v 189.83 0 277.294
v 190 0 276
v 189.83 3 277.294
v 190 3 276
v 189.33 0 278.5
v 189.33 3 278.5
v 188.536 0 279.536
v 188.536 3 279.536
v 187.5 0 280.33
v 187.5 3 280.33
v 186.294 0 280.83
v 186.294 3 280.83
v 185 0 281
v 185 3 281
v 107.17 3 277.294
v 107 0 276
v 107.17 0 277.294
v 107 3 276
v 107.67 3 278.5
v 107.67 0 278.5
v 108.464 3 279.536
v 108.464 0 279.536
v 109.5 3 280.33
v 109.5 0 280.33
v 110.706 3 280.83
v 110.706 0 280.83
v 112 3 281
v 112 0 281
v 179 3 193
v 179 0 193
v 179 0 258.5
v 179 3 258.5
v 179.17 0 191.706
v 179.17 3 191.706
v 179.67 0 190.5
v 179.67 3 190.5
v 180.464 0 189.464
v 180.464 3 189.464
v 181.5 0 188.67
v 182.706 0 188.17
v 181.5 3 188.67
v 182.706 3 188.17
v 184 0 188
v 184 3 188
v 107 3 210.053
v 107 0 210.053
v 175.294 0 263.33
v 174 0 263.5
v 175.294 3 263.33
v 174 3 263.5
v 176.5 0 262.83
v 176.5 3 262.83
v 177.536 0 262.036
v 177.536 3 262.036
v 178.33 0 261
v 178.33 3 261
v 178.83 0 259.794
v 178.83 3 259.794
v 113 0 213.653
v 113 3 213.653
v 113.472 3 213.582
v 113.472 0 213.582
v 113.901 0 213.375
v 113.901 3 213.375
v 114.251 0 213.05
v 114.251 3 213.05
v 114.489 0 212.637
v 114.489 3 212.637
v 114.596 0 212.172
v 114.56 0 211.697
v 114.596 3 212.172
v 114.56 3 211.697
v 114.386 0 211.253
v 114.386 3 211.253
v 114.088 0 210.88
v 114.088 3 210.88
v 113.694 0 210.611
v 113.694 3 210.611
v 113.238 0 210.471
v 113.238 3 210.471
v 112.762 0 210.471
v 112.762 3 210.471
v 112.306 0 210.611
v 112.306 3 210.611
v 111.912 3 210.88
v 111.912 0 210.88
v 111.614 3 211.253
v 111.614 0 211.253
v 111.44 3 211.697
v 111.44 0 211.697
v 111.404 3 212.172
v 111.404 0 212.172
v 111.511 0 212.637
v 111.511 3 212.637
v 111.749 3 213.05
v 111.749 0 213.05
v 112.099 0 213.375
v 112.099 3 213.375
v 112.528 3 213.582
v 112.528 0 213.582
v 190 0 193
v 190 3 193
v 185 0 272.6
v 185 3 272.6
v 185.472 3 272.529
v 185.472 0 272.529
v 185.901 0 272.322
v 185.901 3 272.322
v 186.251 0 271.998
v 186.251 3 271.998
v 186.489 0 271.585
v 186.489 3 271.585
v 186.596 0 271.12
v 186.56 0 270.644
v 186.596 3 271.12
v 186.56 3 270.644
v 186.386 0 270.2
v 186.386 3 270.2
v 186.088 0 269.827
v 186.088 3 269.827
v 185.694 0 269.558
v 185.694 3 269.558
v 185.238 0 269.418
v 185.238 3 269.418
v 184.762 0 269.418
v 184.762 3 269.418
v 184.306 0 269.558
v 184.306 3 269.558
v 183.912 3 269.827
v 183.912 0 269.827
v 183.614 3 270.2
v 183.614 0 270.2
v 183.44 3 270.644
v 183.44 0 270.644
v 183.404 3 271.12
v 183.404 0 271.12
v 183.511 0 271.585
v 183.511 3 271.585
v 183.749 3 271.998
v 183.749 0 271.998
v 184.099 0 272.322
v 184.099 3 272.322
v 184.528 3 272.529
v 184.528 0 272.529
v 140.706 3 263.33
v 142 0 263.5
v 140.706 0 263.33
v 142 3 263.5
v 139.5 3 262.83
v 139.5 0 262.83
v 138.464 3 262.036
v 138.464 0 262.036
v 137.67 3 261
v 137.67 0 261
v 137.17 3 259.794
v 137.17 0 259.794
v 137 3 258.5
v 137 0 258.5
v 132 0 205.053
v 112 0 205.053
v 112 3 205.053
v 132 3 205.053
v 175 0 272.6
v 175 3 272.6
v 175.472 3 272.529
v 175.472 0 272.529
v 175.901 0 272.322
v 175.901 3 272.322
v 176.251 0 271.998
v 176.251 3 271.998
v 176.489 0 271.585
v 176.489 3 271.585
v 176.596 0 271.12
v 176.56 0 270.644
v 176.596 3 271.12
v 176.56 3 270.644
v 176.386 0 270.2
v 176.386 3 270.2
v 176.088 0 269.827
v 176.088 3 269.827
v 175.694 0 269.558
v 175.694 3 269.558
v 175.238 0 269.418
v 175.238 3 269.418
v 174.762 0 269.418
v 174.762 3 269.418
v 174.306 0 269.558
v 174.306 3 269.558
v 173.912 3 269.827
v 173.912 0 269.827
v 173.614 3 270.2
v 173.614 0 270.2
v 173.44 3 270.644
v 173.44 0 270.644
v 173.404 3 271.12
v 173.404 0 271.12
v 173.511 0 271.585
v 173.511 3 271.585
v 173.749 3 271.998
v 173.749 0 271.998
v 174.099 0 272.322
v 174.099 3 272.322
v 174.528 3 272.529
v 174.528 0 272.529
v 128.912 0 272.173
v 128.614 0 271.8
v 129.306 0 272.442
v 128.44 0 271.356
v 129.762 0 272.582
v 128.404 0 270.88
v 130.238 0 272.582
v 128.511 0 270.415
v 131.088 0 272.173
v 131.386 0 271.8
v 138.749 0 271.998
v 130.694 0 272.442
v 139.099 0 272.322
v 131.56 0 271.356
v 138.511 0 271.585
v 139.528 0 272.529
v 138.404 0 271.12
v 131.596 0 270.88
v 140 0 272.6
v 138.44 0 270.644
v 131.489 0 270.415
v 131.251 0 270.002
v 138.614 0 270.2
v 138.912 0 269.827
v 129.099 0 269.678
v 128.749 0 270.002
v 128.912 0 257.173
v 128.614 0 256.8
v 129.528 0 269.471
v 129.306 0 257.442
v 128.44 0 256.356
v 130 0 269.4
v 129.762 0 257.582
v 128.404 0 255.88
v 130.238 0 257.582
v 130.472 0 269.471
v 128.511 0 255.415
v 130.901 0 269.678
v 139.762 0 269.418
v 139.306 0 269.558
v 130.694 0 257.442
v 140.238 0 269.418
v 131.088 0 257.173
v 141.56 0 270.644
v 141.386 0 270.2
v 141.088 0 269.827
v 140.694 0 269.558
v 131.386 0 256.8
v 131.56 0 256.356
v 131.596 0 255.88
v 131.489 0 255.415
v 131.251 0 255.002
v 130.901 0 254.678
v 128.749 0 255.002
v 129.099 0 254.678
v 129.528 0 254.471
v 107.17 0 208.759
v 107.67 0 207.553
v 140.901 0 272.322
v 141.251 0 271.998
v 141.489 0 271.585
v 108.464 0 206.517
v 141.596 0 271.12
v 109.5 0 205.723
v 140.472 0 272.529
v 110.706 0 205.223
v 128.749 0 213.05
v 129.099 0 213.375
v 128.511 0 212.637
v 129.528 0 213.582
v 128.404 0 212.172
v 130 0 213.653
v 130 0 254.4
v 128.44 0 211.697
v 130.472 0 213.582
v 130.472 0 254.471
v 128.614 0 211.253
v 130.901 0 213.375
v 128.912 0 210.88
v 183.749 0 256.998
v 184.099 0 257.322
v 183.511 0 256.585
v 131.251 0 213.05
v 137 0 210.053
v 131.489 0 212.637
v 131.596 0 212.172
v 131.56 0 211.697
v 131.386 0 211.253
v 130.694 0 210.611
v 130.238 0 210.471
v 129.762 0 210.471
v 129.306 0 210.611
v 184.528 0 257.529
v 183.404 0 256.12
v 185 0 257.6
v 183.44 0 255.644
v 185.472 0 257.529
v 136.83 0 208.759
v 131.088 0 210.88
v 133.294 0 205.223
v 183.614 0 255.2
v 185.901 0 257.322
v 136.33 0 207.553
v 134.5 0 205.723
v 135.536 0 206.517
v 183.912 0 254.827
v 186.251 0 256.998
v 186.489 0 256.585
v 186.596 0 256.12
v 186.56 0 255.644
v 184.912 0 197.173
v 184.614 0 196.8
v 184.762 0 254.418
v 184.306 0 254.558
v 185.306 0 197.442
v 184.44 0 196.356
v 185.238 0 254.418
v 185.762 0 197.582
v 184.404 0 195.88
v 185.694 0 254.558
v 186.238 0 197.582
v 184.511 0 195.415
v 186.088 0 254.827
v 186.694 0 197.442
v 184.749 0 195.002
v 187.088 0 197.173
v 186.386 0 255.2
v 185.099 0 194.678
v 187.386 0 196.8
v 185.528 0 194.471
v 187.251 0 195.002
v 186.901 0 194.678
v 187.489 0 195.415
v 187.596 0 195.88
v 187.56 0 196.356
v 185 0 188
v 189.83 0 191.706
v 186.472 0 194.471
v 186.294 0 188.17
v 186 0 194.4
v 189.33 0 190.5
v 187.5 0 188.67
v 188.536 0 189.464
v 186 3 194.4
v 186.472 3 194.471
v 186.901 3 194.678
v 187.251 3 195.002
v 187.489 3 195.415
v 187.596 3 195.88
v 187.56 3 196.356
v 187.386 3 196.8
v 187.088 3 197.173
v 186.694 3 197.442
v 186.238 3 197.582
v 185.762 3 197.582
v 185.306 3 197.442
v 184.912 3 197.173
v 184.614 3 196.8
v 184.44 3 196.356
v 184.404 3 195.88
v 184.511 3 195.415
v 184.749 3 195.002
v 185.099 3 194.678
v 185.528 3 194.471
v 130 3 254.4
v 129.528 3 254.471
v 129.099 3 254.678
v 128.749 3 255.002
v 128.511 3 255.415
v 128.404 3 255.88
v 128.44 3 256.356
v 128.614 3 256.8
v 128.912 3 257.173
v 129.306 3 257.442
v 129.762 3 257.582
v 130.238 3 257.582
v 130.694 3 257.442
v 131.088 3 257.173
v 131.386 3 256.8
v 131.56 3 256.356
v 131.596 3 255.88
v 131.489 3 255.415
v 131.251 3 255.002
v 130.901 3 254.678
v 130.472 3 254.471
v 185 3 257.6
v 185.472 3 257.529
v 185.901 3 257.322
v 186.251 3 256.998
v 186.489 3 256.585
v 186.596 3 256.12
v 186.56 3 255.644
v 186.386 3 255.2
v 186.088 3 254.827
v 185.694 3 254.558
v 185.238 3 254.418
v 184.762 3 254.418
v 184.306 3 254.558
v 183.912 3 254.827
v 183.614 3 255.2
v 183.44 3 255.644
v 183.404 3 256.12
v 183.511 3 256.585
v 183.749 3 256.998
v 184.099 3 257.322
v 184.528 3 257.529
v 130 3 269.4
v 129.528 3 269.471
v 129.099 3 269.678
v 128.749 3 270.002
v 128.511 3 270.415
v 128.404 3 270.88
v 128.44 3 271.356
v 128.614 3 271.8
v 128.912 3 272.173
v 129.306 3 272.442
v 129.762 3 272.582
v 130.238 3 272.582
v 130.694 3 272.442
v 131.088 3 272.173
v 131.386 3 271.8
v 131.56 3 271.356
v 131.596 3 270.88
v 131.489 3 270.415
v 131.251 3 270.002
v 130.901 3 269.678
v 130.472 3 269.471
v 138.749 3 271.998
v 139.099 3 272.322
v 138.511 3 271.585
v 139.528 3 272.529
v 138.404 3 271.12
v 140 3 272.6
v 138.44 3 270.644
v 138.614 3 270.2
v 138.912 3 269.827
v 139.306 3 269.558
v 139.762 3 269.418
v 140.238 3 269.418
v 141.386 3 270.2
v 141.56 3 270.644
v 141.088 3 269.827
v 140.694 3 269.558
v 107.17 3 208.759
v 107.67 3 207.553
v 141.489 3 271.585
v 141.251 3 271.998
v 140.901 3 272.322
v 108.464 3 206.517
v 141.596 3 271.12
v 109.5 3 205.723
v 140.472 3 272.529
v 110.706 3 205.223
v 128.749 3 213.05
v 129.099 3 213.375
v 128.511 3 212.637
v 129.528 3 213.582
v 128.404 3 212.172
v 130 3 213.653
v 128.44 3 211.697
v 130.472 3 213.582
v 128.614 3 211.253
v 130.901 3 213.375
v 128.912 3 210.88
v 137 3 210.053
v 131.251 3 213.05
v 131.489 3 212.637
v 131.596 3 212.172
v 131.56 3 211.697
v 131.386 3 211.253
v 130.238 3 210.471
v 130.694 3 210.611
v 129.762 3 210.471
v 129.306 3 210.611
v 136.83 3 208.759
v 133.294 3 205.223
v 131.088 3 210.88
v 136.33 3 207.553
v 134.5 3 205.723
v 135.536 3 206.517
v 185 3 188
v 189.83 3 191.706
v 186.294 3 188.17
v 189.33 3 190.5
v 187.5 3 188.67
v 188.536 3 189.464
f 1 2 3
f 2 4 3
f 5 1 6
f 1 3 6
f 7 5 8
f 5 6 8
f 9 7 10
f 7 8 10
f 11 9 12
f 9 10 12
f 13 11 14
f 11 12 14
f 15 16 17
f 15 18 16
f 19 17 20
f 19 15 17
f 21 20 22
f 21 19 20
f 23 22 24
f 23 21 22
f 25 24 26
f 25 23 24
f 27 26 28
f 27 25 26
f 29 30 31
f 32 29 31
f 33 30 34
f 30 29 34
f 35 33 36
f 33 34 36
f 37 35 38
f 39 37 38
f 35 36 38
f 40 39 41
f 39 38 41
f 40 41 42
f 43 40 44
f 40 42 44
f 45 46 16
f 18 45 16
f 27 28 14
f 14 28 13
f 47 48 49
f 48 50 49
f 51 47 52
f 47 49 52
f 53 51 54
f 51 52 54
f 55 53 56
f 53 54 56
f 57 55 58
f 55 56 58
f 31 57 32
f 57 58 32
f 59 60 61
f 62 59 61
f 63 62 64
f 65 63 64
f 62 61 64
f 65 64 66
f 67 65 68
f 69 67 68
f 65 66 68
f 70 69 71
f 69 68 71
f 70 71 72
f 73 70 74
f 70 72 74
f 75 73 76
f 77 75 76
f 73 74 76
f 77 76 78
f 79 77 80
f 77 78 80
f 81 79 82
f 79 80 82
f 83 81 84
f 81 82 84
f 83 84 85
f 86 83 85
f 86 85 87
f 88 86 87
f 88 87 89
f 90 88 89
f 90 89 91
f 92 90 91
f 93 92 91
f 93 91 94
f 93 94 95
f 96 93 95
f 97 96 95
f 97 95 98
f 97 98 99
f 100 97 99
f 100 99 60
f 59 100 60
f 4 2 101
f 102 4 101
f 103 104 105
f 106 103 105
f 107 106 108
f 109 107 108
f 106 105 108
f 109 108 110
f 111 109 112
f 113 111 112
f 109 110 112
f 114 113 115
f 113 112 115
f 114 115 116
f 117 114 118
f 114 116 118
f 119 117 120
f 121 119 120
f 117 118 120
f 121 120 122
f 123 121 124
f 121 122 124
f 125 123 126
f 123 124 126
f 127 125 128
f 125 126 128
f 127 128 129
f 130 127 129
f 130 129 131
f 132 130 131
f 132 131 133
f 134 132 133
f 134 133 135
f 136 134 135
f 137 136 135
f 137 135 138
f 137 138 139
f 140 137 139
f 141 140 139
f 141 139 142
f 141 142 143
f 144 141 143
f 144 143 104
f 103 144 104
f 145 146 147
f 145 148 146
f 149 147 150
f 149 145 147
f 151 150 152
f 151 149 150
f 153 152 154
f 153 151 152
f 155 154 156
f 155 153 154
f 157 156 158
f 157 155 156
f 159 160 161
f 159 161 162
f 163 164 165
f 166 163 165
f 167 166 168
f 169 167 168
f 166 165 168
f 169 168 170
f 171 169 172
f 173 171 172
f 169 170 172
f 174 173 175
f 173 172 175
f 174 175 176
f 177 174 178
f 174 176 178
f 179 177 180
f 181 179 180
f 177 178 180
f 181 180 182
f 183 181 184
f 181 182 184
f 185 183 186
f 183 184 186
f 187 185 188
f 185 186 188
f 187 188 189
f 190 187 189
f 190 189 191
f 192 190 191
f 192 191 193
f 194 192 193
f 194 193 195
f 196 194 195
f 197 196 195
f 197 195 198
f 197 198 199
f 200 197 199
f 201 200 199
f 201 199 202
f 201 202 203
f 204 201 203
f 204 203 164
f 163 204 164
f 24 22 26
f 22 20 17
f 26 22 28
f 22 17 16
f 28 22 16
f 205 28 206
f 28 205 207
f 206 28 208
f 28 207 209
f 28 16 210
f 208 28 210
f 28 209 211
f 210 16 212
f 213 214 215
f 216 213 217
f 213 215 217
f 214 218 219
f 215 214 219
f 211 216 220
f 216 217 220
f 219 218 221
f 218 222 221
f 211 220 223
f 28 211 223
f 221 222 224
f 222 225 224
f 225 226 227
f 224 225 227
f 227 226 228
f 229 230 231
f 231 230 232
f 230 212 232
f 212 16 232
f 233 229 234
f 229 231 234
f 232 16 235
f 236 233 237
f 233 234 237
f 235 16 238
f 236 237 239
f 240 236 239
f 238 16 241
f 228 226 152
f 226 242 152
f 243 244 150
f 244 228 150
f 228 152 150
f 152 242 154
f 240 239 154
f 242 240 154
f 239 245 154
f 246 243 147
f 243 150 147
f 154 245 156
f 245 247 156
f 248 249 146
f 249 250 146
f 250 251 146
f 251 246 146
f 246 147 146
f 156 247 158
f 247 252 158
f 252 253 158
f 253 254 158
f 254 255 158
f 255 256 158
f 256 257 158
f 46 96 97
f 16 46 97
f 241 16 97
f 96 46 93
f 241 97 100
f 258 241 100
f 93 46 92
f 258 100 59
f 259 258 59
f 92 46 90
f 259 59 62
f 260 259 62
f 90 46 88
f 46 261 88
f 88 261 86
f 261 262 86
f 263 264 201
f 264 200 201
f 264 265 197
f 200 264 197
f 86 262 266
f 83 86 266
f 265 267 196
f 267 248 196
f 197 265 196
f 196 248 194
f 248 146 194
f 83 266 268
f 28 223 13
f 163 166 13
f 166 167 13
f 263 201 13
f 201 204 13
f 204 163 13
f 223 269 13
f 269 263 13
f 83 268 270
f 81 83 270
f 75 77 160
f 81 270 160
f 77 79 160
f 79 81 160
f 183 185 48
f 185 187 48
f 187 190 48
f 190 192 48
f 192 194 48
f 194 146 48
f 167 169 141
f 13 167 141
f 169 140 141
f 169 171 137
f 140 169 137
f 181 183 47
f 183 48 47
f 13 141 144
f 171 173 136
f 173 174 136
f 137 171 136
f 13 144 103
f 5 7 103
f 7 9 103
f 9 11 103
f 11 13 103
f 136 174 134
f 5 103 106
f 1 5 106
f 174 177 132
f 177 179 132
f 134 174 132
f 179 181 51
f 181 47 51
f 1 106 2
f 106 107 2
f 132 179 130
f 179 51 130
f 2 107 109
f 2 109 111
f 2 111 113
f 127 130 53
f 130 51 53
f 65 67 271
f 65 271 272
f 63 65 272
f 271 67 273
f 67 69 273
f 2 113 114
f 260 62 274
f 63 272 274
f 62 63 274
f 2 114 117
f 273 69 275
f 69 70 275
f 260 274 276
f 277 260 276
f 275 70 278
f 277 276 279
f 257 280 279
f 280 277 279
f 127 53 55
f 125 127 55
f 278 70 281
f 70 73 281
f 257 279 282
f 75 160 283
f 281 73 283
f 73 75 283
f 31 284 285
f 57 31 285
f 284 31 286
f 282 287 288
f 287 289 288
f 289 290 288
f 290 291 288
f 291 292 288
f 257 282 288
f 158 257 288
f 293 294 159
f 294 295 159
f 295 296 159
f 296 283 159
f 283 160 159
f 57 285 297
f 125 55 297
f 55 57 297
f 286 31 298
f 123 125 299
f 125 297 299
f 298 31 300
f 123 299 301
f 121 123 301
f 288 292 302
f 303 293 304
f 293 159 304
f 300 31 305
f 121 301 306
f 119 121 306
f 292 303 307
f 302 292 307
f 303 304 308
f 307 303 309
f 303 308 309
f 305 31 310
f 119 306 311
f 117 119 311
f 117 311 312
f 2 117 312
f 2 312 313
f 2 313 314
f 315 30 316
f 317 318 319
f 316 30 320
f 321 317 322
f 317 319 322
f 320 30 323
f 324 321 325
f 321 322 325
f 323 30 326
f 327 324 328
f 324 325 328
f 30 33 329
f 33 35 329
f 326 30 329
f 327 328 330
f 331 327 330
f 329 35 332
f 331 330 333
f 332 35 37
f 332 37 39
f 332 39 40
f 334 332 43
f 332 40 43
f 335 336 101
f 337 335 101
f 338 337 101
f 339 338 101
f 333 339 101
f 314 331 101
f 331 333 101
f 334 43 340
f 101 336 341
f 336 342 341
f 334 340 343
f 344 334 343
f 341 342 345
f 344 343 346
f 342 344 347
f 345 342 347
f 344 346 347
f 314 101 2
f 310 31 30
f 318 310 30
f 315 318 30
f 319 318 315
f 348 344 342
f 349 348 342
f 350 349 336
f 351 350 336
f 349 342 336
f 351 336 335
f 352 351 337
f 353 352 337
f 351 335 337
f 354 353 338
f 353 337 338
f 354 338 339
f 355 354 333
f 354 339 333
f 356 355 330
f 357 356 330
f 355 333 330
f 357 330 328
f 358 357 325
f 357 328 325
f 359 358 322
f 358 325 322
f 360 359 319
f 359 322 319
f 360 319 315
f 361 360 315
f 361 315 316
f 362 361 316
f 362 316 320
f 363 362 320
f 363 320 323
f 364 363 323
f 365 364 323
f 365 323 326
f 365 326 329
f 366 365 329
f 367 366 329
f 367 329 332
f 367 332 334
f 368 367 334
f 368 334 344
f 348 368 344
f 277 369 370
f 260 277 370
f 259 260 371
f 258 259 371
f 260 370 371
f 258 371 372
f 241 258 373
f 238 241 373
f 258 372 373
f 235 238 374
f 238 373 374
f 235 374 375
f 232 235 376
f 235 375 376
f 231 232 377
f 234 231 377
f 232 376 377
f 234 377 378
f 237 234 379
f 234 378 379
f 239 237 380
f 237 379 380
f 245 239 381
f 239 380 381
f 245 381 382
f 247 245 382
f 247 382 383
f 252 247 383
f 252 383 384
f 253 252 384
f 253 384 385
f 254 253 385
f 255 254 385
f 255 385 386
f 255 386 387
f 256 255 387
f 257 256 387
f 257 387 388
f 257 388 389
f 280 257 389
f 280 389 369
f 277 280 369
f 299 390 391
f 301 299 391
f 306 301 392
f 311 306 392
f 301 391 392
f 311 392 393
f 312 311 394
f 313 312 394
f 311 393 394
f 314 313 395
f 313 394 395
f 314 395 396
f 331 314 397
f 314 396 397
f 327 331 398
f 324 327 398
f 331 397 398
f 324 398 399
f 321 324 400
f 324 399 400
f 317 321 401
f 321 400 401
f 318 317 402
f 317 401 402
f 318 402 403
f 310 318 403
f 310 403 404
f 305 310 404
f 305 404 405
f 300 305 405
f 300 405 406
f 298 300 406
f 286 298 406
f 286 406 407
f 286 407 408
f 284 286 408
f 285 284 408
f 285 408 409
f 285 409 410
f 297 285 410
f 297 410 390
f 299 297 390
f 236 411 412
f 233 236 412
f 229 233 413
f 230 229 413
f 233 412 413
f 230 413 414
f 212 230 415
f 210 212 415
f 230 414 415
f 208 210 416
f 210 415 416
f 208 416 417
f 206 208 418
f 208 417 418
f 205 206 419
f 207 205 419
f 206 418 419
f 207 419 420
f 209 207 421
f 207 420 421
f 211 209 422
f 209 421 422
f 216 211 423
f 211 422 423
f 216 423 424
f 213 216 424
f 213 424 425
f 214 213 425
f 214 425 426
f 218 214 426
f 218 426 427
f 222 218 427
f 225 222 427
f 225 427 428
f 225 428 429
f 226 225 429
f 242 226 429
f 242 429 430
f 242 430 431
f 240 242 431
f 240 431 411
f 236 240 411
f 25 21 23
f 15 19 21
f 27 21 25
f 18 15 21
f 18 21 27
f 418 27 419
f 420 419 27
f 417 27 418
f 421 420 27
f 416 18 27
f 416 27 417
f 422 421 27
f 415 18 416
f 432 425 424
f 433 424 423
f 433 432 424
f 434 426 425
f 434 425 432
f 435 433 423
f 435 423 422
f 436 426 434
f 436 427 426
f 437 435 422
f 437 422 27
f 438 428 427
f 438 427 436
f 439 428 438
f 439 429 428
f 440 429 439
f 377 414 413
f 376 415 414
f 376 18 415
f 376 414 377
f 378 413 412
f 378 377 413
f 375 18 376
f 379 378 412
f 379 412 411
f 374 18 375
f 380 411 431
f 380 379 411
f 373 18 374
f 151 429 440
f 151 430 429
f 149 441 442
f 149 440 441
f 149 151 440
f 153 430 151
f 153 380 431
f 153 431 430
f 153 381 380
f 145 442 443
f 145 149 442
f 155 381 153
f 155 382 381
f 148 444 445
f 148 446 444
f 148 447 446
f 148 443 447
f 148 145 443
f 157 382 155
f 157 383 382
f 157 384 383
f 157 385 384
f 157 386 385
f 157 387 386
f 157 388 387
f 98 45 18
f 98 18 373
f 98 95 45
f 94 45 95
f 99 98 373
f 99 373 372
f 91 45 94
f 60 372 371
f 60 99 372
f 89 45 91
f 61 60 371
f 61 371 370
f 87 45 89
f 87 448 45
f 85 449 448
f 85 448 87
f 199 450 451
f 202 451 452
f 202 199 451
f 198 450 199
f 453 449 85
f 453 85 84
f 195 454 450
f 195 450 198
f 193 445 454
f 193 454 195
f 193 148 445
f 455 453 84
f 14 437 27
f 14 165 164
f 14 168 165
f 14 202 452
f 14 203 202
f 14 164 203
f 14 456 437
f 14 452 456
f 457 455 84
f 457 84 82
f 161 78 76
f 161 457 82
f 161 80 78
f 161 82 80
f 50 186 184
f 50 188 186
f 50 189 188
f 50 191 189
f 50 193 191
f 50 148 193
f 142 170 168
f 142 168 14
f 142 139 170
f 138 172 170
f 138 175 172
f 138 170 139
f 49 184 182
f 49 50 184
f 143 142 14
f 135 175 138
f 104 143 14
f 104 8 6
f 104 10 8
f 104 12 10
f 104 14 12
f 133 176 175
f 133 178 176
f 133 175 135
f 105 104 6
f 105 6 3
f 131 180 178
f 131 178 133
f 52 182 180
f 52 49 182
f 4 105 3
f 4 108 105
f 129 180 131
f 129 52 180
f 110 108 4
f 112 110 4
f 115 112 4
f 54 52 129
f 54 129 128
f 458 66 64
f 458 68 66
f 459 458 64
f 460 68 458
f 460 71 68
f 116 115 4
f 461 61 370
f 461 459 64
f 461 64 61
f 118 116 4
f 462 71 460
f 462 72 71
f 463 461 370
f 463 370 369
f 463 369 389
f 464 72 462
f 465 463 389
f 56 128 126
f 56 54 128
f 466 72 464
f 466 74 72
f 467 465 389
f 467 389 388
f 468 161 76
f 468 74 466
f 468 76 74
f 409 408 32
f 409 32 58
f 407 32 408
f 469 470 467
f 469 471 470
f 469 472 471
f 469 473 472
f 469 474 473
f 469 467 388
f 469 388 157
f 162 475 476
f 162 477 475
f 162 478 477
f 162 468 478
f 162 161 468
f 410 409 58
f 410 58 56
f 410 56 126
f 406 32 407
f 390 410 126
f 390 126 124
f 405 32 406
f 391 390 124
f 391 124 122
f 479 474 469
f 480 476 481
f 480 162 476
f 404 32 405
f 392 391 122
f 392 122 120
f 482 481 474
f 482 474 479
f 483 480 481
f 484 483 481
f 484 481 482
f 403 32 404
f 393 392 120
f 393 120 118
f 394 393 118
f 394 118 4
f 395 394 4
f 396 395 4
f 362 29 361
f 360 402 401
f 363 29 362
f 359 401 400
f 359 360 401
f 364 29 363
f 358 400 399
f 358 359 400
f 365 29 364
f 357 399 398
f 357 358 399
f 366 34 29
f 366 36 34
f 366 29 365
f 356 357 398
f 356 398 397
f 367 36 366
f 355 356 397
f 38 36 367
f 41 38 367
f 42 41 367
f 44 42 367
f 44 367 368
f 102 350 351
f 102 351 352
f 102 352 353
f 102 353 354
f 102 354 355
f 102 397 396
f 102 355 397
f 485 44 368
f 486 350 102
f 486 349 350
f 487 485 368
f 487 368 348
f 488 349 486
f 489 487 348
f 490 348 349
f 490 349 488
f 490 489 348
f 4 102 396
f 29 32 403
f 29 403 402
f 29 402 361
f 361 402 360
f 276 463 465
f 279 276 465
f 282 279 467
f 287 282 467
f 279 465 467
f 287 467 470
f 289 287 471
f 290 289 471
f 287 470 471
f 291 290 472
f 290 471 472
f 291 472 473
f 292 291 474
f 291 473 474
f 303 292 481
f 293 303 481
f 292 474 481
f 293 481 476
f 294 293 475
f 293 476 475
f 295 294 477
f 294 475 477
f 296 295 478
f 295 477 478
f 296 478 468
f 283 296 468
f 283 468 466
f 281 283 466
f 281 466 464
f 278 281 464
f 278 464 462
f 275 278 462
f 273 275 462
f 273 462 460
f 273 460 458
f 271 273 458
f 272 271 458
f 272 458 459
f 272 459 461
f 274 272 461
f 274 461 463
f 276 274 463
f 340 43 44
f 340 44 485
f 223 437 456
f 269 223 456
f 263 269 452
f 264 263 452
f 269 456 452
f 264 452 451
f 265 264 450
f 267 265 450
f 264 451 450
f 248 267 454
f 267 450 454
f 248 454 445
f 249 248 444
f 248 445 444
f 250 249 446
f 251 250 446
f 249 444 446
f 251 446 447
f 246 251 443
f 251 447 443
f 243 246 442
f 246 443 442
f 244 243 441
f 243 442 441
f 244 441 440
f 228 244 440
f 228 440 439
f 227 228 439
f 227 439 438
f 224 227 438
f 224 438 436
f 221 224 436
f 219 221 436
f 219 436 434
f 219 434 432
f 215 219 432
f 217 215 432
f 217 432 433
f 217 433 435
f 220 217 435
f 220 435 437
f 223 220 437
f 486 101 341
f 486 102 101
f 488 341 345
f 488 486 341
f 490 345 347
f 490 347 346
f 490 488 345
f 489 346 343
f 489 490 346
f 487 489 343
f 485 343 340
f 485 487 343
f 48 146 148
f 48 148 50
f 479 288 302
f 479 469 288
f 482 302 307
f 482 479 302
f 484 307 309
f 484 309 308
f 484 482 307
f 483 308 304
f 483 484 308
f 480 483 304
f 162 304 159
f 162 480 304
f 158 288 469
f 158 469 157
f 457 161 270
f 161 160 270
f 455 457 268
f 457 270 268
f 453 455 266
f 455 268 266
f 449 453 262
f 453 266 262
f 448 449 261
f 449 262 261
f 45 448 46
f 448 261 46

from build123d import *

# Parameters (mm, degrees)
EXTRUDE_1049_DEPTH      = 3
SKETCH_2_R              = 37.5
SKETCH_2_R_2            = 1.6
CUT_EXTRUDE_1714_DEPTH  = 3
SKETCH_8_W              = 65
SKETCH_8_H              = 25
CUT_EXTRUDE_2586_DEPTH  = 3
SKETCH_41_W             = 55
SKETCH_41_H             = 60
CUT_EXTRUDE_2_DEPTH     = 10
SKETCH_10_W             = 65
SKETCH_10_H             = 30
CUT_EXTRUDE_3792_DEPTH  = 3
SKETCH_11_R             = 1.6
SKETCH_11_W             = 42
SKETCH_11_H             = 28
CUT_EXTRUDE_4901_DEPTH  = 3
SKETCH_13_R             = 1.6
CUT_EXTRUDE_5557_DEPTH  = 3
SKETCH_14_R             = 2
CUT_EXTRUDE_5907_DEPTH  = 3
SKETCH_15_R             = 2
CUT_EXTRUDE_6167_DEPTH  = 3
SKETCH_16_R             = 1.6
CUT_EXTRUDE_6674_DEPTH  = 3
SKETCH_19_R             = 2
SKETCH_19_R_2           = 2.5
CUT_EXTRUDE_7840_DEPTH  = 3
SKETCH_21_R             = 1.6
CUT_EXTRUDE_7992_DEPTH  = 3
CUT_EXTRUDE_9_DEPTH     = 10
SKETCH_33_R             = 1.6
PC_DEPTH                = 10
SKETCH_36_R             = 1.6
CUT_EXTRUDE_9335_DEPTH  = 345.206333469
SKETCH_29_R             = 1.6
CUT_EXTRUDE_9717_DEPTH  = 10
SKETCH_39_R             = 1.6
CUT_EXTRUDE_10319_DEPTH = 10
SKETCH_42_W             = 40
SKETCH_42_H             = 40
CUT_EXTRUDE_11_DEPTH    = 10
SKETCH_34_R             = 1.6
UWB_DEPTH               = 10
SKETCH_47_R             = 1.6
CUT_EXTRUDE_13152_DEPTH = 345.206333469
SKETCH_48_R             = 1.6
CUT_EXTRUDE_14_DEPTH    = 345.206333469
CUT_EXTRUDE_6623_DEPTH  = 10
FILLET_13947_R          = 5
FILLET_14546_R          = 2
SKETCH_53_R             = 1.6
RFID_DEPTH              = 10
SKETCH_54_R             = 1.6
CUT_EXTRUDE_19167_DEPTH = 10
SKETCH_55_OUTSIDE_W     = 518.68
SKETCH_55_OUTSIDE_H     = 706.68
CUT_EXTRUDE_17_DEPTH    = 10
FILLET_1_R              = 5
SKETCH_56_W             = 16
SKETCH_56_H             = 59
CUT_EXTRUDE_18_DEPTH    = 10
SKETCH_57_R             = 1.55
CUT_EXTRUDE_19_DEPTH    = 10
SKETCH_59_R             = 1.6
CUT_EXTRUDE_20_DEPTH    = 10
FILLET_2_R              = 2
SKETCH_60_W             = 42
SKETCH_60_H             = 75.5
CUT_EXTRUDE_21_DEPTH    = 10
SKETCH_61_W             = 23.311710065
SKETCH_61_H             = 85.935142547
CUT_EXTRUDE_22_DEPTH    = 10
SKETCH_62_W             = 30
SKETCH_62_H             = 17.052631579
CUT_EXTRUDE_23_DEPTH    = 10
SKETCH_63_R             = 1.6
CUT_EXTRUDE_24_DEPTH    = 10
FILLET_3_R              = 5


with BuildPart() as part:
    # 草图1 → Extrude 1049 (new body)
    with BuildSketch(Plane(origin=(0, 0, 0), x_dir=(1, 0, 0), z_dir=(0, 1, 0))):
        Polygon((190, 287), (101.545, 287), (79.605689771, 249), (-79.605689771, 249), (-101.545, 287), (-190, 287), (-190, 0), (-190, -281), (-144.091695942, -281), (-98.660254038, -281), (-74.411542732, -239), (74.411542732, -239), (98.660254038, -281), (144.091695942, -281), (190, -281), (190, 0), align=None)
    extrude(amount=EXTRUDE_1049_DEPTH)

    # 草图2 → Cut-Extrude 1714 (cut)
    with BuildSketch(Plane(origin=(0, 3, 0), x_dir=(1, 0, 0), z_dir=(0, 1, 0))):
        Circle(SKETCH_2_R)
        with Locations((38.97114317, 22.5)):
            Circle(SKETCH_2_R_2)
        with Locations((0, -45)):
            Circle(SKETCH_2_R_2)
        with Locations((-38.97114317, 22.5)):
            Circle(SKETCH_2_R_2)
    extrude(amount=-CUT_EXTRUDE_1714_DEPTH, mode=Mode.SUBTRACT)

    # 草图8 → Cut-Extrude 2586 (cut)
    with BuildSketch(Plane(origin=(0, 3, 0), x_dir=(1, 0, 0), z_dir=(0, 1, 0))):
        with Locations((115, -161.5)):
            Rectangle(SKETCH_8_W, SKETCH_8_H)
        with Locations((-115, -161.5)):
            Rectangle(SKETCH_8_W, SKETCH_8_H)
    extrude(amount=-CUT_EXTRUDE_2586_DEPTH, mode=Mode.SUBTRACT)

    # 草图41 → 减重过线孔2 (cut)
    with BuildSketch(Plane(origin=(0, 3, 0), x_dir=(1, 0, 0), z_dir=(0, 1, 0))):
        with Locations((-102.5, 70)):
            Rectangle(SKETCH_41_W, SKETCH_41_H)
        with Locations((102.5, 70)):
            Rectangle(SKETCH_41_W, SKETCH_41_H)
        with Locations((102.5, -70)):
            Rectangle(SKETCH_41_W, SKETCH_41_H)
        with Locations((-102.5, -70)):
            Rectangle(SKETCH_41_W, SKETCH_41_H)
    extrude(amount=-CUT_EXTRUDE_2_DEPTH, mode=Mode.SUBTRACT)

    # 草图10 → Cut-Extrude 3792 (cut)
    with BuildSketch(Plane(origin=(0, 3, 0), x_dir=(1, 0, 0), z_dir=(0, 1, 0))):
        with Locations((-130, 167)):
            Rectangle(SKETCH_10_W, SKETCH_10_H)
        with Locations((130, 167)):
            Rectangle(SKETCH_10_W, SKETCH_10_H)
    extrude(amount=-CUT_EXTRUDE_3792_DEPTH, mode=Mode.SUBTRACT)

    # 草图11 → Cut-Extrude 4901 (cut)
    with BuildSketch(Plane(origin=(0, 3, 0), x_dir=(1, 0, 0), z_dir=(0, 1, 0))):
        with Locations((-153.5, 259)):
            Circle(SKETCH_11_R)
        with Locations((-162.5, 259)):
            Circle(SKETCH_11_R)
        with Locations((-153.5, 209)):
            Circle(SKETCH_11_R)
        with Locations((-162.5, 209)):
            Circle(SKETCH_11_R)
        with Locations((153.5, 259)):
            Circle(SKETCH_11_R)
        with Locations((162.5, 259)):
            Circle(SKETCH_11_R)
        with Locations((153.5, 209)):
            Circle(SKETCH_11_R)
        with Locations((162.5, 209)):
            Circle(SKETCH_11_R)
        with Locations((162.5, -209)):
            Circle(SKETCH_11_R)
        with Locations((153.5, -209)):
            Circle(SKETCH_11_R)
        with Locations((162.5, -259)):
            Circle(SKETCH_11_R)
        with Locations((153.5, -259)):
            Circle(SKETCH_11_R)
        with Locations((-162.5, -209)):
            Circle(SKETCH_11_R)
        with Locations((-153.5, -209)):
            Circle(SKETCH_11_R)
        with Locations((-153.5, -259)):
            Circle(SKETCH_11_R)
        with Locations((-162.5, -259)):
            Circle(SKETCH_11_R)
        with Locations((-158, 234)):
            Rectangle(SKETCH_11_W, SKETCH_11_H)
        with Locations((158, 234)):
            Rectangle(SKETCH_11_W, SKETCH_11_H)
        with Locations((158, -234)):
            Rectangle(SKETCH_11_W, SKETCH_11_H)
        with Locations((-158, -234)):
            Rectangle(SKETCH_11_W, SKETCH_11_H)
    extrude(amount=-CUT_EXTRUDE_4901_DEPTH, mode=Mode.SUBTRACT)

    # 草图13 → Cut-Extrude 5557 (cut)
    with BuildSketch(Plane(origin=(0, 3, 0), x_dir=(1, 0, 0), z_dir=(0, 1, 0))):
        with Locations((25, 176)):
            Circle(SKETCH_13_R)
        with Locations((25, 226)):
            Circle(SKETCH_13_R)
        with Locations((-25, 226)):
            Circle(SKETCH_13_R)
        with Locations((-25, 176)):
            Circle(SKETCH_13_R)
    extrude(amount=-CUT_EXTRUDE_5557_DEPTH, mode=Mode.SUBTRACT)

    # 草图14 → Cut-Extrude 5907 (cut)
    with BuildSketch(Plane(origin=(0, 3, 0), x_dir=(1, 0, 0), z_dir=(0, 1, 0))):
        with Locations((-47.5, 239)):
            Circle(SKETCH_14_R)
        with Locations((-47.5, 214)):
            Circle(SKETCH_14_R)
        with Locations((47.5, 214)):
            Circle(SKETCH_14_R)
        with Locations((47.5, 239)):
            Circle(SKETCH_14_R)
        with Locations((-47.5, -207)):
            Circle(SKETCH_14_R)
        with Locations((-47.5, -232)):
            Circle(SKETCH_14_R)
        with Locations((47.5, -232)):
            Circle(SKETCH_14_R)
        with Locations((47.5, -207)):
            Circle(SKETCH_14_R)
    extrude(amount=-CUT_EXTRUDE_5907_DEPTH, mode=Mode.SUBTRACT)

    # 草图15 → Cut-Extrude 6167 (cut)
    with BuildSketch(Plane(origin=(0, 3, 0), x_dir=(1, 0, 0), z_dir=(0, 1, 0))):
        with Locations((155, 47.5)):
            Circle(SKETCH_15_R)
        with Locations((180, 47.5)):
            Circle(SKETCH_15_R)
        with Locations((180, -47.5)):
            Circle(SKETCH_15_R)
        with Locations((155, -47.5)):
            Circle(SKETCH_15_R)
        with Locations((-155, -47.5)):
            Circle(SKETCH_15_R)
        with Locations((-180, -47.5)):
            Circle(SKETCH_15_R)
        with Locations((-180, 47.5)):
            Circle(SKETCH_15_R)
        with Locations((-155, 47.5)):
            Circle(SKETCH_15_R)
    extrude(amount=-CUT_EXTRUDE_6167_DEPTH, mode=Mode.SUBTRACT)

    # 草图16 → Cut-Extrude 6674 (cut)
    with BuildSketch(Plane(origin=(0, 3, 0), x_dir=(1, 0, 0), z_dir=(0, 1, 0))):
        with Locations((-64, 229)):
            Circle(SKETCH_16_R)
        with Locations((-64, 117)):
            Circle(SKETCH_16_R)
        with Locations((-64, 5)):
            Circle(SKETCH_16_R)
        with Locations((-64, -107)):
            Circle(SKETCH_16_R)
        with Locations((-64, -219)):
            Circle(SKETCH_16_R)
        with Locations((64, 229)):
            Circle(SKETCH_16_R)
        with Locations((64, -107)):
            Circle(SKETCH_16_R)
        with Locations((64, 5)):
            Circle(SKETCH_16_R)
        with Locations((64, 117)):
            Circle(SKETCH_16_R)
        with Locations((64, -219)):
            Circle(SKETCH_16_R)
    extrude(amount=-CUT_EXTRUDE_6674_DEPTH, mode=Mode.SUBTRACT)

    # 草图19 → Cut-Extrude 7840 (cut)
    with BuildSketch(Plane(origin=(0, 3, 0), x_dir=(1, 0, 0), z_dir=(0, 1, 0))):
        with Locations((-177.5, -78)):
            Circle(SKETCH_19_R)
        with Locations((-177.5, -94)):
            Circle(SKETCH_19_R_2)
        with Locations((-177.5, 94)):
            Circle(SKETCH_19_R_2)
        with Locations((-177.5, 78)):
            Circle(SKETCH_19_R)
        with Locations((177.5, -94)):
            Circle(SKETCH_19_R_2)
        with Locations((177.5, -78)):
            Circle(SKETCH_19_R)
        with Locations((177.5, 78)):
            Circle(SKETCH_19_R)
        with Locations((177.5, 94)):
            Circle(SKETCH_19_R_2)
    extrude(amount=-CUT_EXTRUDE_7840_DEPTH, mode=Mode.SUBTRACT)

    # 草图21 → Cut-Extrude 7992 (cut)
    with BuildSketch(Plane(origin=(0, 3, 0), x_dir=(1, 0, 0), z_dir=(0, 1, 0))):
        with Locations((0, -93)):
            Circle(SKETCH_21_R)
    extrude(amount=-CUT_EXTRUDE_7992_DEPTH, mode=Mode.SUBTRACT)

    # 草图32 → 切除-拉伸9 (cut)
    with BuildSketch(Plane(origin=(0, 3, 0), x_dir=(1, 0, 0), z_dir=(0, 1, 0))):
        with BuildLine():
            Line((-34.5, -190), (34.5, -190))
            ThreePointArc((34.5, -190), (36.621320344, -189.121320344), (37.5, -187))
            Line((37.5, -187), (37.5, -133))
            ThreePointArc((37.5, -133), (36.621320344, -130.878679656), (34.5, -130))
            Line((34.5, -130), (-34.5, -130))
            ThreePointArc((-34.5, -130), (-36.621320344, -130.878679656), (-37.5, -133))
            Line((-37.5, -133), (-37.5, -187))
            ThreePointArc((-37.5, -187), (-36.621320344, -189.121320344), (-34.5, -190))
        make_face()
    extrude(amount=-CUT_EXTRUDE_9_DEPTH, mode=Mode.SUBTRACT)

    # 草图33 → PC座固定孔 (cut)
    with BuildSketch(Plane(origin=(0, 3, 0), x_dir=(1, 0, 0), z_dir=(0, 1, 0))):
        with Locations((-42.5, -120.5)):
            Circle(SKETCH_33_R)
        with Locations((42.5, -120.5)):
            Circle(SKETCH_33_R)
    extrude(amount=-PC_DEPTH, mode=Mode.SUBTRACT)

    # 草图36 → Cut-Extrude 9335 (cut, through all)
    with BuildSketch(Plane(origin=(0, 3, 0), x_dir=(1, 0, 0), z_dir=(0, 1, 0))):
        with Locations((-80, -231)):
            Circle(SKETCH_36_R)
        with Locations((-80, -219)):
            Circle(SKETCH_36_R)
        with Locations((80, -219)):
            Circle(SKETCH_36_R)
        with Locations((80, -231)):
            Circle(SKETCH_36_R)
        with Locations((-80, 241)):
            Circle(SKETCH_36_R)
        with Locations((-80, 229)):
            Circle(SKETCH_36_R)
        with Locations((80, 229)):
            Circle(SKETCH_36_R)
        with Locations((80, 241)):
            Circle(SKETCH_36_R)
    extrude(amount=-CUT_EXTRUDE_9335_DEPTH, mode=Mode.SUBTRACT)

    # 草图29 → Cut-Extrude 9717 (cut)
    with BuildSketch(Plane(origin=(0, 3, 0), x_dir=(1, 0, 0), z_dir=(0, 1, 0))):
        with Locations((48, 120)):
            Circle(SKETCH_29_R)
        with Locations((0, 86)):
            Circle(SKETCH_29_R)
        with Locations((0, 154)):
            Circle(SKETCH_29_R)
        with Locations((-48, 120)):
            Circle(SKETCH_29_R)
        with BuildLine():
            Line((40, 98), (40, 142))
            ThreePointArc((40, 142), (39.121320344, 144.121320344), (37, 145))
            Line((37, 145), (-37, 145))
            ThreePointArc((-37, 145), (-39.121320344, 144.121320344), (-40, 142))
            Line((-40, 142), (-40, 98))
            ThreePointArc((-40, 98), (-39.121320344, 95.878679656), (-37, 95))
            Line((-37, 95), (37, 95))
            ThreePointArc((37, 95), (39.121320344, 95.878679656), (40, 98))
        make_face()
    extrude(amount=-CUT_EXTRUDE_9717_DEPTH, mode=Mode.SUBTRACT)

    # 草图39 → Cut-Extrude 10319 (cut)
    with BuildSketch(Plane(origin=(0, 3, 0), x_dir=(1, 0, 0), z_dir=(0, 1, 0))):
        with Locations((185, -271)):
            Circle(SKETCH_39_R)
        with Locations((185, -256)):
            Circle(SKETCH_39_R)
        with Locations((130, -256)):
            Circle(SKETCH_39_R)
        with Locations((130, -271)):
            Circle(SKETCH_39_R)
        with Locations((-130, -271)):
            Circle(SKETCH_39_R)
        with Locations((-130, -256)):
            Circle(SKETCH_39_R)
        with Locations((-185, -256)):
            Circle(SKETCH_39_R)
        with Locations((-185, -271)):
            Circle(SKETCH_39_R)
        with Locations((-130, 262)):
            Circle(SKETCH_39_R)
        with Locations((-130, 277)):
            Circle(SKETCH_39_R)
        with Locations((185, 262)):
            Circle(SKETCH_39_R)
        with Locations((185, 277)):
            Circle(SKETCH_39_R)
        with Locations((-185, 277)):
            Circle(SKETCH_39_R)
        with Locations((-185, 262)):
            Circle(SKETCH_39_R)
        with Locations((130, 277)):
            Circle(SKETCH_39_R)
        with Locations((130, 262)):
            Circle(SKETCH_39_R)
    extrude(amount=-CUT_EXTRUDE_10319_DEPTH, mode=Mode.SUBTRACT)

    # 草图42 → 切除-拉伸11 (cut)
    with BuildSketch(Plane(origin=(0, 3, 0), x_dir=(1, 0, 0), z_dir=(0, 1, 0))):
        with Locations((0, 201)):
            Rectangle(SKETCH_42_W, SKETCH_42_H)
    extrude(amount=-CUT_EXTRUDE_11_DEPTH, mode=Mode.SUBTRACT)

    # 草图34 → UWB固定孔 (cut)
    with BuildSketch(Plane(origin=(0, 3, 0), x_dir=(1, 0, 0), z_dir=(0, 1, 0))):
        with Locations((90, 168)):
            Circle(SKETCH_34_R)
        with Locations((71, 187)):
            Circle(SKETCH_34_R)
        with Locations((90, 206)):
            Circle(SKETCH_34_R)
        with Locations((109, 187)):
            Circle(SKETCH_34_R)
    extrude(amount=-UWB_DEPTH, mode=Mode.SUBTRACT)

    # 草图47 → Cut-Extrude 13152 (cut, through all)
    with BuildSketch(Plane(origin=(0, 3, 0), x_dir=(1, 0, 0), z_dir=(0, 1, 0))):
        with Locations((140, 277)):
            Circle(SKETCH_47_R)
        with Locations((185, -271)):
            Circle(SKETCH_47_R)
        with Locations((95, -231)):
            Circle(SKETCH_47_R)
        with Locations((175, -271)):
            Circle(SKETCH_47_R)
        with Locations((140, 213)):
            Circle(SKETCH_47_R)
        with Locations((175, -207)):
            Circle(SKETCH_47_R)
        with Locations((-140, -271)):
            Circle(SKETCH_47_R)
        with Locations((-140, -207)):
            Circle(SKETCH_47_R)
        with Locations((-175, 213)):
            Circle(SKETCH_47_R)
        with Locations((-95, 237)):
            Circle(SKETCH_47_R)
        with Locations((185, 277)):
            Circle(SKETCH_47_R)
        with Locations((175, 277)):
            Circle(SKETCH_47_R)
        with Locations((95, 237)):
            Circle(SKETCH_47_R)
        with Locations((175, 213)):
            Circle(SKETCH_47_R)
        with Locations((-175, 277)):
            Circle(SKETCH_47_R)
        with Locations((-185, 277)):
            Circle(SKETCH_47_R)
        with Locations((140, -207)):
            Circle(SKETCH_47_R)
        with Locations((140, -271)):
            Circle(SKETCH_47_R)
        with Locations((-175, -207)):
            Circle(SKETCH_47_R)
        with Locations((-140, 213)):
            Circle(SKETCH_47_R)
        with Locations((-175, -271)):
            Circle(SKETCH_47_R)
        with Locations((-95, -231)):
            Circle(SKETCH_47_R)
        with Locations((-185, -271)):
            Circle(SKETCH_47_R)
        with Locations((-140, 277)):
            Circle(SKETCH_47_R)
    extrude(amount=-CUT_EXTRUDE_13152_DEPTH, mode=Mode.SUBTRACT)

    # 草图48 → 切除-拉伸14 (cut, through all)
    with BuildSketch(Plane(origin=(0, 3, 0), x_dir=(1, 0, 0), z_dir=(0, 1, 0))):
        with Locations((-44.5, -46)):
            Circle(SKETCH_48_R)
        with Locations((44.5, -46)):
            Circle(SKETCH_48_R)
        with Locations((-9, -196)):
            Circle(SKETCH_48_R)
        with Locations((9, -196)):
            Circle(SKETCH_48_R)
    extrude(amount=-CUT_EXTRUDE_14_DEPTH, mode=Mode.SUBTRACT)

    # 草图51 → 6623电机过线孔 (cut)
    with BuildSketch(Plane(origin=(0, 3, 0), x_dir=(1, 0, 0), z_dir=(0, 1, 0))):
        with BuildLine():
            Line((-20.5, 67.5), (20.5, 67.5))
            ThreePointArc((20.5, 67.5), (21.914213562, 66.914213562), (22.5, 65.5))
            Line((22.5, 65.5), (22.5, 54.5))
            ThreePointArc((22.5, 54.5), (21.914213562, 53.085786438), (20.5, 52.5))
            Line((20.5, 52.5), (-20.5, 52.5))
            ThreePointArc((-20.5, 52.5), (-21.914213562, 53.085786438), (-22.5, 54.5))
            Line((-22.5, 54.5), (-22.5, 65.5))
            ThreePointArc((-22.5, 65.5), (-21.914213562, 66.914213562), (-20.5, 67.5))
        make_face()
    extrude(amount=-CUT_EXTRUDE_6623_DEPTH, mode=Mode.SUBTRACT)

    # Fillet 13947
    fillet_13947_edges = [part.edges().sort_by_distance(p)[0] for p in [
        (-190, 1.5, -287),
        (-101.545, 1.5, -287),
        (-79.605689771, 1.5, -249),
        (79.605689771, 1.5, -249),
        (101.545, 1.5, -287),
        (190, 1.5, -287),
        (190, 1.5, 281),
        (98.660254038, 1.5, 281),
        (74.411542732, 1.5, 239),
        (-74.411542732, 1.5, 239),
        (-98.660254038, 1.5, 281),
        (-190, 1.5, 281),
    ]]
    fillet(fillet_13947_edges, radius=FILLET_13947_R)

    # Fillet 14546
    fillet_14546_edges = [part.edges().sort_by_distance(p)[0] for p in [
        (-147.5, 1.5, 149),
        (-82.5, 1.5, 149),
        (-82.5, 1.5, 174),
        (-147.5, 1.5, 174),
        (82.5, 1.5, 149),
        (147.5, 1.5, 149),
        (147.5, 1.5, 174),
        (82.5, 1.5, 174),
        (-130, 1.5, -100),
        (-75, 1.5, -100),
        (-75, 1.5, -40),
        (-130, 1.5, -40),
        (-130, 1.5, 100),
        (-130, 1.5, 40),
        (-75, 1.5, 40),
        (-75, 1.5, 100),
        (130, 1.5, 100),
        (75, 1.5, 100),
        (75, 1.5, 40),
        (130, 1.5, 40),
        (130, 1.5, -100),
        (130, 1.5, -40),
        (75, 1.5, -40),
        (75, 1.5, -100),
        (-97.5, 1.5, -152),
        (-162.5, 1.5, -152),
        (-162.5, 1.5, -182),
        (-97.5, 1.5, -182),
        (162.5, 1.5, -182),
        (-137, 1.5, -220),
        (-179, 1.5, -220),
        (-179, 1.5, -248),
        (-137, 1.5, -248),
        (-179, 1.5, 220),
        (-137, 1.5, 220),
        (-137, 1.5, 248),
        (179, 1.5, 248),
        (137, 1.5, 248),
        (137, 1.5, 220),
        (179, 1.5, 220),
        (179, 1.5, -248),
        (179, 1.5, -220),
        (137, 1.5, -220),
        (137, 1.5, -248),
        (20, 1.5, -181),
        (-20, 1.5, -181),
        (-20, 1.5, -221),
        (20, 1.5, -221),
        (-179, 1.5, 248),
        (162.5, 1.5, -152),
        (97.5, 1.5, -152),
        (97.5, 1.5, -182),
    ]]
    fillet(fillet_14546_edges, radius=FILLET_14546_R)

    # 草图53 → RFID固定孔 (cut)
    with BuildSketch(Plane(origin=(0, 3, 0), x_dir=(1, 0, 0), z_dir=(0, 1, 0))):
        with Locations((-135, -31)):
            Circle(SKETCH_53_R)
        with Locations((-85, -31)):
            Circle(SKETCH_53_R)
        with Locations((-85, 31)):
            Circle(SKETCH_53_R)
        with Locations((-135, 31)):
            Circle(SKETCH_53_R)
        with Locations((135, 31)):
            Circle(SKETCH_53_R)
        with Locations((85, 31)):
            Circle(SKETCH_53_R)
        with Locations((85, -31)):
            Circle(SKETCH_53_R)
        with Locations((135, -31)):
            Circle(SKETCH_53_R)
    extrude(amount=-RFID_DEPTH, mode=Mode.SUBTRACT)

    # 草图54 → Cut-Extrude 19167 (cut)
    with BuildSketch(Plane.XZ):
        with Locations((-102.122350269, -278)):
            Circle(SKETCH_54_R)
        with Locations((-92.122350269, -260.679491924)):
            Circle(SKETCH_54_R)
        with Locations((92.122350269, -260.679491924)):
            Circle(SKETCH_54_R)
        with Locations((102.122350269, -278)):
            Circle(SKETCH_54_R)
        with Locations((102.122350269, 272)):
            Circle(SKETCH_54_R)
        with Locations((92.122350269, 254.679491924)):
            Circle(SKETCH_54_R)
        with Locations((-92.122350269, 254.679491924)):
            Circle(SKETCH_54_R)
        with Locations((-102.122350269, 272)):
            Circle(SKETCH_54_R)
    extrude(amount=-CUT_EXTRUDE_19167_DEPTH, mode=Mode.SUBTRACT)

    # 草图55 outside → 切除-拉伸17 (cut)
    with BuildSketch(Plane.XZ):
        with Locations((0, -3)):
            Rectangle(SKETCH_55_OUTSIDE_W, SKETCH_55_OUTSIDE_H)
        with BuildLine():
            Line((190, 281), (101.547005384, 281))
            ThreePointArc((101.547005384, 281), (99.047005384, 280.330127019), (97.216878365, 278.5))
            Line((97.216878365, 278.5), (87, 260.803847577))
            Line((87, 260.803847577), (87, 224))
            Line((87, 224), (125, 188))
            Line((125, 188), (190, 188))
            Line((190, 188), (190, 281))
        make_face(mode=Mode.SUBTRACT)
    extrude(amount=-CUT_EXTRUDE_17_DEPTH, mode=Mode.SUBTRACT)

    # 圆角1
    fillet_1_edges = [part.edges().sort_by_distance(p)[0] for p in [
        (190, 1.5, 188),
        (87, 1.5, 260.803847577),
        (87, 1.5, 224),
        (125, 1.5, 188),
    ]]
    fillet(fillet_1_edges, radius=FILLET_1_R)

    # 草图56 → 切除-拉伸18 (cut)
    with BuildSketch(Plane.XZ):
        with Locations((158, 234)):
            Rectangle(SKETCH_56_W, SKETCH_56_H)
    extrude(amount=-CUT_EXTRUDE_18_DEPTH, mode=Mode.SUBTRACT)

    # 草图57 → 切除-拉伸19 (cut)
    with BuildSketch(Plane.XZ):
        with Locations((150, 206.05)):
            Circle(SKETCH_57_R)
        with Locations((166, 206.05)):
            Circle(SKETCH_57_R)
        with Locations((166, 261.95)):
            Circle(SKETCH_57_R)
        with Locations((150, 261.95)):
            Circle(SKETCH_57_R)
    extrude(amount=-CUT_EXTRUDE_19_DEPTH, mode=Mode.SUBTRACT)

    # 草图59 → 切除-拉伸20 (cut)
    with BuildSketch(Plane.XZ):
        with Locations((130, 196)):
            Circle(SKETCH_59_R)
        with Locations((186, 196)):
            Circle(SKETCH_59_R)
    extrude(amount=-CUT_EXTRUDE_20_DEPTH, mode=Mode.SUBTRACT)

    # 圆角2
    fillet_2_edges = [part.edges().sort_by_distance(p)[0] for p in [
        (150, 1.5, 248),
        (166, 1.5, 248),
        (166, 1.5, 220),
        (150, 1.5, 220),
    ]]
    fillet(fillet_2_edges, radius=FILLET_2_R)

    # 草图60 → 切除-拉伸21 (cut)
    with BuildSketch(Plane.XZ):
        with Locations((158, 225.75)):
            Rectangle(SKETCH_60_W, SKETCH_60_H)
    extrude(amount=-CUT_EXTRUDE_21_DEPTH, mode=Mode.SUBTRACT)

    # 草图61 → 切除-拉伸22 (cut)
    with BuildSketch(Plane.XZ):
        with Locations((95.344144968, 238.032428727)):
            Rectangle(SKETCH_61_W, SKETCH_61_H)
    extrude(amount=-CUT_EXTRUDE_22_DEPTH, mode=Mode.SUBTRACT)

    # 草图62 → 切除-拉伸23 (cut)
    with BuildSketch(Plane.XZ):
        with Locations((122, 196.52631579)):
            Rectangle(SKETCH_62_W, SKETCH_62_H)
    extrude(amount=-CUT_EXTRUDE_23_DEPTH, mode=Mode.SUBTRACT)

    # 草图63 → 切除-拉伸24 (cut)
    with BuildSketch(Plane(origin=(0, 3, 0), x_dir=(1, 0, 0), z_dir=(0, 1, 0))):
        with Locations((130, -212.052631579)):
            Circle(SKETCH_63_R)
        with Locations((113, -212.052631579)):
            Circle(SKETCH_63_R)
    extrude(amount=-CUT_EXTRUDE_24_DEPTH, mode=Mode.SUBTRACT)

    # 圆角3
    fillet_3_edges = [part.edges().sort_by_distance(p)[0] for p in [
        (179, 1.5, 263.5),
        (179, 1.5, 188),
        (107, 1.5, 281),
        (107, 1.5, 205.052631579),
        (137, 1.5, 205.052631579),
        (137, 1.5, 263.5),
    ]]
    fillet(fillet_3_edges, radius=FILLET_3_R)


solid = part.part
